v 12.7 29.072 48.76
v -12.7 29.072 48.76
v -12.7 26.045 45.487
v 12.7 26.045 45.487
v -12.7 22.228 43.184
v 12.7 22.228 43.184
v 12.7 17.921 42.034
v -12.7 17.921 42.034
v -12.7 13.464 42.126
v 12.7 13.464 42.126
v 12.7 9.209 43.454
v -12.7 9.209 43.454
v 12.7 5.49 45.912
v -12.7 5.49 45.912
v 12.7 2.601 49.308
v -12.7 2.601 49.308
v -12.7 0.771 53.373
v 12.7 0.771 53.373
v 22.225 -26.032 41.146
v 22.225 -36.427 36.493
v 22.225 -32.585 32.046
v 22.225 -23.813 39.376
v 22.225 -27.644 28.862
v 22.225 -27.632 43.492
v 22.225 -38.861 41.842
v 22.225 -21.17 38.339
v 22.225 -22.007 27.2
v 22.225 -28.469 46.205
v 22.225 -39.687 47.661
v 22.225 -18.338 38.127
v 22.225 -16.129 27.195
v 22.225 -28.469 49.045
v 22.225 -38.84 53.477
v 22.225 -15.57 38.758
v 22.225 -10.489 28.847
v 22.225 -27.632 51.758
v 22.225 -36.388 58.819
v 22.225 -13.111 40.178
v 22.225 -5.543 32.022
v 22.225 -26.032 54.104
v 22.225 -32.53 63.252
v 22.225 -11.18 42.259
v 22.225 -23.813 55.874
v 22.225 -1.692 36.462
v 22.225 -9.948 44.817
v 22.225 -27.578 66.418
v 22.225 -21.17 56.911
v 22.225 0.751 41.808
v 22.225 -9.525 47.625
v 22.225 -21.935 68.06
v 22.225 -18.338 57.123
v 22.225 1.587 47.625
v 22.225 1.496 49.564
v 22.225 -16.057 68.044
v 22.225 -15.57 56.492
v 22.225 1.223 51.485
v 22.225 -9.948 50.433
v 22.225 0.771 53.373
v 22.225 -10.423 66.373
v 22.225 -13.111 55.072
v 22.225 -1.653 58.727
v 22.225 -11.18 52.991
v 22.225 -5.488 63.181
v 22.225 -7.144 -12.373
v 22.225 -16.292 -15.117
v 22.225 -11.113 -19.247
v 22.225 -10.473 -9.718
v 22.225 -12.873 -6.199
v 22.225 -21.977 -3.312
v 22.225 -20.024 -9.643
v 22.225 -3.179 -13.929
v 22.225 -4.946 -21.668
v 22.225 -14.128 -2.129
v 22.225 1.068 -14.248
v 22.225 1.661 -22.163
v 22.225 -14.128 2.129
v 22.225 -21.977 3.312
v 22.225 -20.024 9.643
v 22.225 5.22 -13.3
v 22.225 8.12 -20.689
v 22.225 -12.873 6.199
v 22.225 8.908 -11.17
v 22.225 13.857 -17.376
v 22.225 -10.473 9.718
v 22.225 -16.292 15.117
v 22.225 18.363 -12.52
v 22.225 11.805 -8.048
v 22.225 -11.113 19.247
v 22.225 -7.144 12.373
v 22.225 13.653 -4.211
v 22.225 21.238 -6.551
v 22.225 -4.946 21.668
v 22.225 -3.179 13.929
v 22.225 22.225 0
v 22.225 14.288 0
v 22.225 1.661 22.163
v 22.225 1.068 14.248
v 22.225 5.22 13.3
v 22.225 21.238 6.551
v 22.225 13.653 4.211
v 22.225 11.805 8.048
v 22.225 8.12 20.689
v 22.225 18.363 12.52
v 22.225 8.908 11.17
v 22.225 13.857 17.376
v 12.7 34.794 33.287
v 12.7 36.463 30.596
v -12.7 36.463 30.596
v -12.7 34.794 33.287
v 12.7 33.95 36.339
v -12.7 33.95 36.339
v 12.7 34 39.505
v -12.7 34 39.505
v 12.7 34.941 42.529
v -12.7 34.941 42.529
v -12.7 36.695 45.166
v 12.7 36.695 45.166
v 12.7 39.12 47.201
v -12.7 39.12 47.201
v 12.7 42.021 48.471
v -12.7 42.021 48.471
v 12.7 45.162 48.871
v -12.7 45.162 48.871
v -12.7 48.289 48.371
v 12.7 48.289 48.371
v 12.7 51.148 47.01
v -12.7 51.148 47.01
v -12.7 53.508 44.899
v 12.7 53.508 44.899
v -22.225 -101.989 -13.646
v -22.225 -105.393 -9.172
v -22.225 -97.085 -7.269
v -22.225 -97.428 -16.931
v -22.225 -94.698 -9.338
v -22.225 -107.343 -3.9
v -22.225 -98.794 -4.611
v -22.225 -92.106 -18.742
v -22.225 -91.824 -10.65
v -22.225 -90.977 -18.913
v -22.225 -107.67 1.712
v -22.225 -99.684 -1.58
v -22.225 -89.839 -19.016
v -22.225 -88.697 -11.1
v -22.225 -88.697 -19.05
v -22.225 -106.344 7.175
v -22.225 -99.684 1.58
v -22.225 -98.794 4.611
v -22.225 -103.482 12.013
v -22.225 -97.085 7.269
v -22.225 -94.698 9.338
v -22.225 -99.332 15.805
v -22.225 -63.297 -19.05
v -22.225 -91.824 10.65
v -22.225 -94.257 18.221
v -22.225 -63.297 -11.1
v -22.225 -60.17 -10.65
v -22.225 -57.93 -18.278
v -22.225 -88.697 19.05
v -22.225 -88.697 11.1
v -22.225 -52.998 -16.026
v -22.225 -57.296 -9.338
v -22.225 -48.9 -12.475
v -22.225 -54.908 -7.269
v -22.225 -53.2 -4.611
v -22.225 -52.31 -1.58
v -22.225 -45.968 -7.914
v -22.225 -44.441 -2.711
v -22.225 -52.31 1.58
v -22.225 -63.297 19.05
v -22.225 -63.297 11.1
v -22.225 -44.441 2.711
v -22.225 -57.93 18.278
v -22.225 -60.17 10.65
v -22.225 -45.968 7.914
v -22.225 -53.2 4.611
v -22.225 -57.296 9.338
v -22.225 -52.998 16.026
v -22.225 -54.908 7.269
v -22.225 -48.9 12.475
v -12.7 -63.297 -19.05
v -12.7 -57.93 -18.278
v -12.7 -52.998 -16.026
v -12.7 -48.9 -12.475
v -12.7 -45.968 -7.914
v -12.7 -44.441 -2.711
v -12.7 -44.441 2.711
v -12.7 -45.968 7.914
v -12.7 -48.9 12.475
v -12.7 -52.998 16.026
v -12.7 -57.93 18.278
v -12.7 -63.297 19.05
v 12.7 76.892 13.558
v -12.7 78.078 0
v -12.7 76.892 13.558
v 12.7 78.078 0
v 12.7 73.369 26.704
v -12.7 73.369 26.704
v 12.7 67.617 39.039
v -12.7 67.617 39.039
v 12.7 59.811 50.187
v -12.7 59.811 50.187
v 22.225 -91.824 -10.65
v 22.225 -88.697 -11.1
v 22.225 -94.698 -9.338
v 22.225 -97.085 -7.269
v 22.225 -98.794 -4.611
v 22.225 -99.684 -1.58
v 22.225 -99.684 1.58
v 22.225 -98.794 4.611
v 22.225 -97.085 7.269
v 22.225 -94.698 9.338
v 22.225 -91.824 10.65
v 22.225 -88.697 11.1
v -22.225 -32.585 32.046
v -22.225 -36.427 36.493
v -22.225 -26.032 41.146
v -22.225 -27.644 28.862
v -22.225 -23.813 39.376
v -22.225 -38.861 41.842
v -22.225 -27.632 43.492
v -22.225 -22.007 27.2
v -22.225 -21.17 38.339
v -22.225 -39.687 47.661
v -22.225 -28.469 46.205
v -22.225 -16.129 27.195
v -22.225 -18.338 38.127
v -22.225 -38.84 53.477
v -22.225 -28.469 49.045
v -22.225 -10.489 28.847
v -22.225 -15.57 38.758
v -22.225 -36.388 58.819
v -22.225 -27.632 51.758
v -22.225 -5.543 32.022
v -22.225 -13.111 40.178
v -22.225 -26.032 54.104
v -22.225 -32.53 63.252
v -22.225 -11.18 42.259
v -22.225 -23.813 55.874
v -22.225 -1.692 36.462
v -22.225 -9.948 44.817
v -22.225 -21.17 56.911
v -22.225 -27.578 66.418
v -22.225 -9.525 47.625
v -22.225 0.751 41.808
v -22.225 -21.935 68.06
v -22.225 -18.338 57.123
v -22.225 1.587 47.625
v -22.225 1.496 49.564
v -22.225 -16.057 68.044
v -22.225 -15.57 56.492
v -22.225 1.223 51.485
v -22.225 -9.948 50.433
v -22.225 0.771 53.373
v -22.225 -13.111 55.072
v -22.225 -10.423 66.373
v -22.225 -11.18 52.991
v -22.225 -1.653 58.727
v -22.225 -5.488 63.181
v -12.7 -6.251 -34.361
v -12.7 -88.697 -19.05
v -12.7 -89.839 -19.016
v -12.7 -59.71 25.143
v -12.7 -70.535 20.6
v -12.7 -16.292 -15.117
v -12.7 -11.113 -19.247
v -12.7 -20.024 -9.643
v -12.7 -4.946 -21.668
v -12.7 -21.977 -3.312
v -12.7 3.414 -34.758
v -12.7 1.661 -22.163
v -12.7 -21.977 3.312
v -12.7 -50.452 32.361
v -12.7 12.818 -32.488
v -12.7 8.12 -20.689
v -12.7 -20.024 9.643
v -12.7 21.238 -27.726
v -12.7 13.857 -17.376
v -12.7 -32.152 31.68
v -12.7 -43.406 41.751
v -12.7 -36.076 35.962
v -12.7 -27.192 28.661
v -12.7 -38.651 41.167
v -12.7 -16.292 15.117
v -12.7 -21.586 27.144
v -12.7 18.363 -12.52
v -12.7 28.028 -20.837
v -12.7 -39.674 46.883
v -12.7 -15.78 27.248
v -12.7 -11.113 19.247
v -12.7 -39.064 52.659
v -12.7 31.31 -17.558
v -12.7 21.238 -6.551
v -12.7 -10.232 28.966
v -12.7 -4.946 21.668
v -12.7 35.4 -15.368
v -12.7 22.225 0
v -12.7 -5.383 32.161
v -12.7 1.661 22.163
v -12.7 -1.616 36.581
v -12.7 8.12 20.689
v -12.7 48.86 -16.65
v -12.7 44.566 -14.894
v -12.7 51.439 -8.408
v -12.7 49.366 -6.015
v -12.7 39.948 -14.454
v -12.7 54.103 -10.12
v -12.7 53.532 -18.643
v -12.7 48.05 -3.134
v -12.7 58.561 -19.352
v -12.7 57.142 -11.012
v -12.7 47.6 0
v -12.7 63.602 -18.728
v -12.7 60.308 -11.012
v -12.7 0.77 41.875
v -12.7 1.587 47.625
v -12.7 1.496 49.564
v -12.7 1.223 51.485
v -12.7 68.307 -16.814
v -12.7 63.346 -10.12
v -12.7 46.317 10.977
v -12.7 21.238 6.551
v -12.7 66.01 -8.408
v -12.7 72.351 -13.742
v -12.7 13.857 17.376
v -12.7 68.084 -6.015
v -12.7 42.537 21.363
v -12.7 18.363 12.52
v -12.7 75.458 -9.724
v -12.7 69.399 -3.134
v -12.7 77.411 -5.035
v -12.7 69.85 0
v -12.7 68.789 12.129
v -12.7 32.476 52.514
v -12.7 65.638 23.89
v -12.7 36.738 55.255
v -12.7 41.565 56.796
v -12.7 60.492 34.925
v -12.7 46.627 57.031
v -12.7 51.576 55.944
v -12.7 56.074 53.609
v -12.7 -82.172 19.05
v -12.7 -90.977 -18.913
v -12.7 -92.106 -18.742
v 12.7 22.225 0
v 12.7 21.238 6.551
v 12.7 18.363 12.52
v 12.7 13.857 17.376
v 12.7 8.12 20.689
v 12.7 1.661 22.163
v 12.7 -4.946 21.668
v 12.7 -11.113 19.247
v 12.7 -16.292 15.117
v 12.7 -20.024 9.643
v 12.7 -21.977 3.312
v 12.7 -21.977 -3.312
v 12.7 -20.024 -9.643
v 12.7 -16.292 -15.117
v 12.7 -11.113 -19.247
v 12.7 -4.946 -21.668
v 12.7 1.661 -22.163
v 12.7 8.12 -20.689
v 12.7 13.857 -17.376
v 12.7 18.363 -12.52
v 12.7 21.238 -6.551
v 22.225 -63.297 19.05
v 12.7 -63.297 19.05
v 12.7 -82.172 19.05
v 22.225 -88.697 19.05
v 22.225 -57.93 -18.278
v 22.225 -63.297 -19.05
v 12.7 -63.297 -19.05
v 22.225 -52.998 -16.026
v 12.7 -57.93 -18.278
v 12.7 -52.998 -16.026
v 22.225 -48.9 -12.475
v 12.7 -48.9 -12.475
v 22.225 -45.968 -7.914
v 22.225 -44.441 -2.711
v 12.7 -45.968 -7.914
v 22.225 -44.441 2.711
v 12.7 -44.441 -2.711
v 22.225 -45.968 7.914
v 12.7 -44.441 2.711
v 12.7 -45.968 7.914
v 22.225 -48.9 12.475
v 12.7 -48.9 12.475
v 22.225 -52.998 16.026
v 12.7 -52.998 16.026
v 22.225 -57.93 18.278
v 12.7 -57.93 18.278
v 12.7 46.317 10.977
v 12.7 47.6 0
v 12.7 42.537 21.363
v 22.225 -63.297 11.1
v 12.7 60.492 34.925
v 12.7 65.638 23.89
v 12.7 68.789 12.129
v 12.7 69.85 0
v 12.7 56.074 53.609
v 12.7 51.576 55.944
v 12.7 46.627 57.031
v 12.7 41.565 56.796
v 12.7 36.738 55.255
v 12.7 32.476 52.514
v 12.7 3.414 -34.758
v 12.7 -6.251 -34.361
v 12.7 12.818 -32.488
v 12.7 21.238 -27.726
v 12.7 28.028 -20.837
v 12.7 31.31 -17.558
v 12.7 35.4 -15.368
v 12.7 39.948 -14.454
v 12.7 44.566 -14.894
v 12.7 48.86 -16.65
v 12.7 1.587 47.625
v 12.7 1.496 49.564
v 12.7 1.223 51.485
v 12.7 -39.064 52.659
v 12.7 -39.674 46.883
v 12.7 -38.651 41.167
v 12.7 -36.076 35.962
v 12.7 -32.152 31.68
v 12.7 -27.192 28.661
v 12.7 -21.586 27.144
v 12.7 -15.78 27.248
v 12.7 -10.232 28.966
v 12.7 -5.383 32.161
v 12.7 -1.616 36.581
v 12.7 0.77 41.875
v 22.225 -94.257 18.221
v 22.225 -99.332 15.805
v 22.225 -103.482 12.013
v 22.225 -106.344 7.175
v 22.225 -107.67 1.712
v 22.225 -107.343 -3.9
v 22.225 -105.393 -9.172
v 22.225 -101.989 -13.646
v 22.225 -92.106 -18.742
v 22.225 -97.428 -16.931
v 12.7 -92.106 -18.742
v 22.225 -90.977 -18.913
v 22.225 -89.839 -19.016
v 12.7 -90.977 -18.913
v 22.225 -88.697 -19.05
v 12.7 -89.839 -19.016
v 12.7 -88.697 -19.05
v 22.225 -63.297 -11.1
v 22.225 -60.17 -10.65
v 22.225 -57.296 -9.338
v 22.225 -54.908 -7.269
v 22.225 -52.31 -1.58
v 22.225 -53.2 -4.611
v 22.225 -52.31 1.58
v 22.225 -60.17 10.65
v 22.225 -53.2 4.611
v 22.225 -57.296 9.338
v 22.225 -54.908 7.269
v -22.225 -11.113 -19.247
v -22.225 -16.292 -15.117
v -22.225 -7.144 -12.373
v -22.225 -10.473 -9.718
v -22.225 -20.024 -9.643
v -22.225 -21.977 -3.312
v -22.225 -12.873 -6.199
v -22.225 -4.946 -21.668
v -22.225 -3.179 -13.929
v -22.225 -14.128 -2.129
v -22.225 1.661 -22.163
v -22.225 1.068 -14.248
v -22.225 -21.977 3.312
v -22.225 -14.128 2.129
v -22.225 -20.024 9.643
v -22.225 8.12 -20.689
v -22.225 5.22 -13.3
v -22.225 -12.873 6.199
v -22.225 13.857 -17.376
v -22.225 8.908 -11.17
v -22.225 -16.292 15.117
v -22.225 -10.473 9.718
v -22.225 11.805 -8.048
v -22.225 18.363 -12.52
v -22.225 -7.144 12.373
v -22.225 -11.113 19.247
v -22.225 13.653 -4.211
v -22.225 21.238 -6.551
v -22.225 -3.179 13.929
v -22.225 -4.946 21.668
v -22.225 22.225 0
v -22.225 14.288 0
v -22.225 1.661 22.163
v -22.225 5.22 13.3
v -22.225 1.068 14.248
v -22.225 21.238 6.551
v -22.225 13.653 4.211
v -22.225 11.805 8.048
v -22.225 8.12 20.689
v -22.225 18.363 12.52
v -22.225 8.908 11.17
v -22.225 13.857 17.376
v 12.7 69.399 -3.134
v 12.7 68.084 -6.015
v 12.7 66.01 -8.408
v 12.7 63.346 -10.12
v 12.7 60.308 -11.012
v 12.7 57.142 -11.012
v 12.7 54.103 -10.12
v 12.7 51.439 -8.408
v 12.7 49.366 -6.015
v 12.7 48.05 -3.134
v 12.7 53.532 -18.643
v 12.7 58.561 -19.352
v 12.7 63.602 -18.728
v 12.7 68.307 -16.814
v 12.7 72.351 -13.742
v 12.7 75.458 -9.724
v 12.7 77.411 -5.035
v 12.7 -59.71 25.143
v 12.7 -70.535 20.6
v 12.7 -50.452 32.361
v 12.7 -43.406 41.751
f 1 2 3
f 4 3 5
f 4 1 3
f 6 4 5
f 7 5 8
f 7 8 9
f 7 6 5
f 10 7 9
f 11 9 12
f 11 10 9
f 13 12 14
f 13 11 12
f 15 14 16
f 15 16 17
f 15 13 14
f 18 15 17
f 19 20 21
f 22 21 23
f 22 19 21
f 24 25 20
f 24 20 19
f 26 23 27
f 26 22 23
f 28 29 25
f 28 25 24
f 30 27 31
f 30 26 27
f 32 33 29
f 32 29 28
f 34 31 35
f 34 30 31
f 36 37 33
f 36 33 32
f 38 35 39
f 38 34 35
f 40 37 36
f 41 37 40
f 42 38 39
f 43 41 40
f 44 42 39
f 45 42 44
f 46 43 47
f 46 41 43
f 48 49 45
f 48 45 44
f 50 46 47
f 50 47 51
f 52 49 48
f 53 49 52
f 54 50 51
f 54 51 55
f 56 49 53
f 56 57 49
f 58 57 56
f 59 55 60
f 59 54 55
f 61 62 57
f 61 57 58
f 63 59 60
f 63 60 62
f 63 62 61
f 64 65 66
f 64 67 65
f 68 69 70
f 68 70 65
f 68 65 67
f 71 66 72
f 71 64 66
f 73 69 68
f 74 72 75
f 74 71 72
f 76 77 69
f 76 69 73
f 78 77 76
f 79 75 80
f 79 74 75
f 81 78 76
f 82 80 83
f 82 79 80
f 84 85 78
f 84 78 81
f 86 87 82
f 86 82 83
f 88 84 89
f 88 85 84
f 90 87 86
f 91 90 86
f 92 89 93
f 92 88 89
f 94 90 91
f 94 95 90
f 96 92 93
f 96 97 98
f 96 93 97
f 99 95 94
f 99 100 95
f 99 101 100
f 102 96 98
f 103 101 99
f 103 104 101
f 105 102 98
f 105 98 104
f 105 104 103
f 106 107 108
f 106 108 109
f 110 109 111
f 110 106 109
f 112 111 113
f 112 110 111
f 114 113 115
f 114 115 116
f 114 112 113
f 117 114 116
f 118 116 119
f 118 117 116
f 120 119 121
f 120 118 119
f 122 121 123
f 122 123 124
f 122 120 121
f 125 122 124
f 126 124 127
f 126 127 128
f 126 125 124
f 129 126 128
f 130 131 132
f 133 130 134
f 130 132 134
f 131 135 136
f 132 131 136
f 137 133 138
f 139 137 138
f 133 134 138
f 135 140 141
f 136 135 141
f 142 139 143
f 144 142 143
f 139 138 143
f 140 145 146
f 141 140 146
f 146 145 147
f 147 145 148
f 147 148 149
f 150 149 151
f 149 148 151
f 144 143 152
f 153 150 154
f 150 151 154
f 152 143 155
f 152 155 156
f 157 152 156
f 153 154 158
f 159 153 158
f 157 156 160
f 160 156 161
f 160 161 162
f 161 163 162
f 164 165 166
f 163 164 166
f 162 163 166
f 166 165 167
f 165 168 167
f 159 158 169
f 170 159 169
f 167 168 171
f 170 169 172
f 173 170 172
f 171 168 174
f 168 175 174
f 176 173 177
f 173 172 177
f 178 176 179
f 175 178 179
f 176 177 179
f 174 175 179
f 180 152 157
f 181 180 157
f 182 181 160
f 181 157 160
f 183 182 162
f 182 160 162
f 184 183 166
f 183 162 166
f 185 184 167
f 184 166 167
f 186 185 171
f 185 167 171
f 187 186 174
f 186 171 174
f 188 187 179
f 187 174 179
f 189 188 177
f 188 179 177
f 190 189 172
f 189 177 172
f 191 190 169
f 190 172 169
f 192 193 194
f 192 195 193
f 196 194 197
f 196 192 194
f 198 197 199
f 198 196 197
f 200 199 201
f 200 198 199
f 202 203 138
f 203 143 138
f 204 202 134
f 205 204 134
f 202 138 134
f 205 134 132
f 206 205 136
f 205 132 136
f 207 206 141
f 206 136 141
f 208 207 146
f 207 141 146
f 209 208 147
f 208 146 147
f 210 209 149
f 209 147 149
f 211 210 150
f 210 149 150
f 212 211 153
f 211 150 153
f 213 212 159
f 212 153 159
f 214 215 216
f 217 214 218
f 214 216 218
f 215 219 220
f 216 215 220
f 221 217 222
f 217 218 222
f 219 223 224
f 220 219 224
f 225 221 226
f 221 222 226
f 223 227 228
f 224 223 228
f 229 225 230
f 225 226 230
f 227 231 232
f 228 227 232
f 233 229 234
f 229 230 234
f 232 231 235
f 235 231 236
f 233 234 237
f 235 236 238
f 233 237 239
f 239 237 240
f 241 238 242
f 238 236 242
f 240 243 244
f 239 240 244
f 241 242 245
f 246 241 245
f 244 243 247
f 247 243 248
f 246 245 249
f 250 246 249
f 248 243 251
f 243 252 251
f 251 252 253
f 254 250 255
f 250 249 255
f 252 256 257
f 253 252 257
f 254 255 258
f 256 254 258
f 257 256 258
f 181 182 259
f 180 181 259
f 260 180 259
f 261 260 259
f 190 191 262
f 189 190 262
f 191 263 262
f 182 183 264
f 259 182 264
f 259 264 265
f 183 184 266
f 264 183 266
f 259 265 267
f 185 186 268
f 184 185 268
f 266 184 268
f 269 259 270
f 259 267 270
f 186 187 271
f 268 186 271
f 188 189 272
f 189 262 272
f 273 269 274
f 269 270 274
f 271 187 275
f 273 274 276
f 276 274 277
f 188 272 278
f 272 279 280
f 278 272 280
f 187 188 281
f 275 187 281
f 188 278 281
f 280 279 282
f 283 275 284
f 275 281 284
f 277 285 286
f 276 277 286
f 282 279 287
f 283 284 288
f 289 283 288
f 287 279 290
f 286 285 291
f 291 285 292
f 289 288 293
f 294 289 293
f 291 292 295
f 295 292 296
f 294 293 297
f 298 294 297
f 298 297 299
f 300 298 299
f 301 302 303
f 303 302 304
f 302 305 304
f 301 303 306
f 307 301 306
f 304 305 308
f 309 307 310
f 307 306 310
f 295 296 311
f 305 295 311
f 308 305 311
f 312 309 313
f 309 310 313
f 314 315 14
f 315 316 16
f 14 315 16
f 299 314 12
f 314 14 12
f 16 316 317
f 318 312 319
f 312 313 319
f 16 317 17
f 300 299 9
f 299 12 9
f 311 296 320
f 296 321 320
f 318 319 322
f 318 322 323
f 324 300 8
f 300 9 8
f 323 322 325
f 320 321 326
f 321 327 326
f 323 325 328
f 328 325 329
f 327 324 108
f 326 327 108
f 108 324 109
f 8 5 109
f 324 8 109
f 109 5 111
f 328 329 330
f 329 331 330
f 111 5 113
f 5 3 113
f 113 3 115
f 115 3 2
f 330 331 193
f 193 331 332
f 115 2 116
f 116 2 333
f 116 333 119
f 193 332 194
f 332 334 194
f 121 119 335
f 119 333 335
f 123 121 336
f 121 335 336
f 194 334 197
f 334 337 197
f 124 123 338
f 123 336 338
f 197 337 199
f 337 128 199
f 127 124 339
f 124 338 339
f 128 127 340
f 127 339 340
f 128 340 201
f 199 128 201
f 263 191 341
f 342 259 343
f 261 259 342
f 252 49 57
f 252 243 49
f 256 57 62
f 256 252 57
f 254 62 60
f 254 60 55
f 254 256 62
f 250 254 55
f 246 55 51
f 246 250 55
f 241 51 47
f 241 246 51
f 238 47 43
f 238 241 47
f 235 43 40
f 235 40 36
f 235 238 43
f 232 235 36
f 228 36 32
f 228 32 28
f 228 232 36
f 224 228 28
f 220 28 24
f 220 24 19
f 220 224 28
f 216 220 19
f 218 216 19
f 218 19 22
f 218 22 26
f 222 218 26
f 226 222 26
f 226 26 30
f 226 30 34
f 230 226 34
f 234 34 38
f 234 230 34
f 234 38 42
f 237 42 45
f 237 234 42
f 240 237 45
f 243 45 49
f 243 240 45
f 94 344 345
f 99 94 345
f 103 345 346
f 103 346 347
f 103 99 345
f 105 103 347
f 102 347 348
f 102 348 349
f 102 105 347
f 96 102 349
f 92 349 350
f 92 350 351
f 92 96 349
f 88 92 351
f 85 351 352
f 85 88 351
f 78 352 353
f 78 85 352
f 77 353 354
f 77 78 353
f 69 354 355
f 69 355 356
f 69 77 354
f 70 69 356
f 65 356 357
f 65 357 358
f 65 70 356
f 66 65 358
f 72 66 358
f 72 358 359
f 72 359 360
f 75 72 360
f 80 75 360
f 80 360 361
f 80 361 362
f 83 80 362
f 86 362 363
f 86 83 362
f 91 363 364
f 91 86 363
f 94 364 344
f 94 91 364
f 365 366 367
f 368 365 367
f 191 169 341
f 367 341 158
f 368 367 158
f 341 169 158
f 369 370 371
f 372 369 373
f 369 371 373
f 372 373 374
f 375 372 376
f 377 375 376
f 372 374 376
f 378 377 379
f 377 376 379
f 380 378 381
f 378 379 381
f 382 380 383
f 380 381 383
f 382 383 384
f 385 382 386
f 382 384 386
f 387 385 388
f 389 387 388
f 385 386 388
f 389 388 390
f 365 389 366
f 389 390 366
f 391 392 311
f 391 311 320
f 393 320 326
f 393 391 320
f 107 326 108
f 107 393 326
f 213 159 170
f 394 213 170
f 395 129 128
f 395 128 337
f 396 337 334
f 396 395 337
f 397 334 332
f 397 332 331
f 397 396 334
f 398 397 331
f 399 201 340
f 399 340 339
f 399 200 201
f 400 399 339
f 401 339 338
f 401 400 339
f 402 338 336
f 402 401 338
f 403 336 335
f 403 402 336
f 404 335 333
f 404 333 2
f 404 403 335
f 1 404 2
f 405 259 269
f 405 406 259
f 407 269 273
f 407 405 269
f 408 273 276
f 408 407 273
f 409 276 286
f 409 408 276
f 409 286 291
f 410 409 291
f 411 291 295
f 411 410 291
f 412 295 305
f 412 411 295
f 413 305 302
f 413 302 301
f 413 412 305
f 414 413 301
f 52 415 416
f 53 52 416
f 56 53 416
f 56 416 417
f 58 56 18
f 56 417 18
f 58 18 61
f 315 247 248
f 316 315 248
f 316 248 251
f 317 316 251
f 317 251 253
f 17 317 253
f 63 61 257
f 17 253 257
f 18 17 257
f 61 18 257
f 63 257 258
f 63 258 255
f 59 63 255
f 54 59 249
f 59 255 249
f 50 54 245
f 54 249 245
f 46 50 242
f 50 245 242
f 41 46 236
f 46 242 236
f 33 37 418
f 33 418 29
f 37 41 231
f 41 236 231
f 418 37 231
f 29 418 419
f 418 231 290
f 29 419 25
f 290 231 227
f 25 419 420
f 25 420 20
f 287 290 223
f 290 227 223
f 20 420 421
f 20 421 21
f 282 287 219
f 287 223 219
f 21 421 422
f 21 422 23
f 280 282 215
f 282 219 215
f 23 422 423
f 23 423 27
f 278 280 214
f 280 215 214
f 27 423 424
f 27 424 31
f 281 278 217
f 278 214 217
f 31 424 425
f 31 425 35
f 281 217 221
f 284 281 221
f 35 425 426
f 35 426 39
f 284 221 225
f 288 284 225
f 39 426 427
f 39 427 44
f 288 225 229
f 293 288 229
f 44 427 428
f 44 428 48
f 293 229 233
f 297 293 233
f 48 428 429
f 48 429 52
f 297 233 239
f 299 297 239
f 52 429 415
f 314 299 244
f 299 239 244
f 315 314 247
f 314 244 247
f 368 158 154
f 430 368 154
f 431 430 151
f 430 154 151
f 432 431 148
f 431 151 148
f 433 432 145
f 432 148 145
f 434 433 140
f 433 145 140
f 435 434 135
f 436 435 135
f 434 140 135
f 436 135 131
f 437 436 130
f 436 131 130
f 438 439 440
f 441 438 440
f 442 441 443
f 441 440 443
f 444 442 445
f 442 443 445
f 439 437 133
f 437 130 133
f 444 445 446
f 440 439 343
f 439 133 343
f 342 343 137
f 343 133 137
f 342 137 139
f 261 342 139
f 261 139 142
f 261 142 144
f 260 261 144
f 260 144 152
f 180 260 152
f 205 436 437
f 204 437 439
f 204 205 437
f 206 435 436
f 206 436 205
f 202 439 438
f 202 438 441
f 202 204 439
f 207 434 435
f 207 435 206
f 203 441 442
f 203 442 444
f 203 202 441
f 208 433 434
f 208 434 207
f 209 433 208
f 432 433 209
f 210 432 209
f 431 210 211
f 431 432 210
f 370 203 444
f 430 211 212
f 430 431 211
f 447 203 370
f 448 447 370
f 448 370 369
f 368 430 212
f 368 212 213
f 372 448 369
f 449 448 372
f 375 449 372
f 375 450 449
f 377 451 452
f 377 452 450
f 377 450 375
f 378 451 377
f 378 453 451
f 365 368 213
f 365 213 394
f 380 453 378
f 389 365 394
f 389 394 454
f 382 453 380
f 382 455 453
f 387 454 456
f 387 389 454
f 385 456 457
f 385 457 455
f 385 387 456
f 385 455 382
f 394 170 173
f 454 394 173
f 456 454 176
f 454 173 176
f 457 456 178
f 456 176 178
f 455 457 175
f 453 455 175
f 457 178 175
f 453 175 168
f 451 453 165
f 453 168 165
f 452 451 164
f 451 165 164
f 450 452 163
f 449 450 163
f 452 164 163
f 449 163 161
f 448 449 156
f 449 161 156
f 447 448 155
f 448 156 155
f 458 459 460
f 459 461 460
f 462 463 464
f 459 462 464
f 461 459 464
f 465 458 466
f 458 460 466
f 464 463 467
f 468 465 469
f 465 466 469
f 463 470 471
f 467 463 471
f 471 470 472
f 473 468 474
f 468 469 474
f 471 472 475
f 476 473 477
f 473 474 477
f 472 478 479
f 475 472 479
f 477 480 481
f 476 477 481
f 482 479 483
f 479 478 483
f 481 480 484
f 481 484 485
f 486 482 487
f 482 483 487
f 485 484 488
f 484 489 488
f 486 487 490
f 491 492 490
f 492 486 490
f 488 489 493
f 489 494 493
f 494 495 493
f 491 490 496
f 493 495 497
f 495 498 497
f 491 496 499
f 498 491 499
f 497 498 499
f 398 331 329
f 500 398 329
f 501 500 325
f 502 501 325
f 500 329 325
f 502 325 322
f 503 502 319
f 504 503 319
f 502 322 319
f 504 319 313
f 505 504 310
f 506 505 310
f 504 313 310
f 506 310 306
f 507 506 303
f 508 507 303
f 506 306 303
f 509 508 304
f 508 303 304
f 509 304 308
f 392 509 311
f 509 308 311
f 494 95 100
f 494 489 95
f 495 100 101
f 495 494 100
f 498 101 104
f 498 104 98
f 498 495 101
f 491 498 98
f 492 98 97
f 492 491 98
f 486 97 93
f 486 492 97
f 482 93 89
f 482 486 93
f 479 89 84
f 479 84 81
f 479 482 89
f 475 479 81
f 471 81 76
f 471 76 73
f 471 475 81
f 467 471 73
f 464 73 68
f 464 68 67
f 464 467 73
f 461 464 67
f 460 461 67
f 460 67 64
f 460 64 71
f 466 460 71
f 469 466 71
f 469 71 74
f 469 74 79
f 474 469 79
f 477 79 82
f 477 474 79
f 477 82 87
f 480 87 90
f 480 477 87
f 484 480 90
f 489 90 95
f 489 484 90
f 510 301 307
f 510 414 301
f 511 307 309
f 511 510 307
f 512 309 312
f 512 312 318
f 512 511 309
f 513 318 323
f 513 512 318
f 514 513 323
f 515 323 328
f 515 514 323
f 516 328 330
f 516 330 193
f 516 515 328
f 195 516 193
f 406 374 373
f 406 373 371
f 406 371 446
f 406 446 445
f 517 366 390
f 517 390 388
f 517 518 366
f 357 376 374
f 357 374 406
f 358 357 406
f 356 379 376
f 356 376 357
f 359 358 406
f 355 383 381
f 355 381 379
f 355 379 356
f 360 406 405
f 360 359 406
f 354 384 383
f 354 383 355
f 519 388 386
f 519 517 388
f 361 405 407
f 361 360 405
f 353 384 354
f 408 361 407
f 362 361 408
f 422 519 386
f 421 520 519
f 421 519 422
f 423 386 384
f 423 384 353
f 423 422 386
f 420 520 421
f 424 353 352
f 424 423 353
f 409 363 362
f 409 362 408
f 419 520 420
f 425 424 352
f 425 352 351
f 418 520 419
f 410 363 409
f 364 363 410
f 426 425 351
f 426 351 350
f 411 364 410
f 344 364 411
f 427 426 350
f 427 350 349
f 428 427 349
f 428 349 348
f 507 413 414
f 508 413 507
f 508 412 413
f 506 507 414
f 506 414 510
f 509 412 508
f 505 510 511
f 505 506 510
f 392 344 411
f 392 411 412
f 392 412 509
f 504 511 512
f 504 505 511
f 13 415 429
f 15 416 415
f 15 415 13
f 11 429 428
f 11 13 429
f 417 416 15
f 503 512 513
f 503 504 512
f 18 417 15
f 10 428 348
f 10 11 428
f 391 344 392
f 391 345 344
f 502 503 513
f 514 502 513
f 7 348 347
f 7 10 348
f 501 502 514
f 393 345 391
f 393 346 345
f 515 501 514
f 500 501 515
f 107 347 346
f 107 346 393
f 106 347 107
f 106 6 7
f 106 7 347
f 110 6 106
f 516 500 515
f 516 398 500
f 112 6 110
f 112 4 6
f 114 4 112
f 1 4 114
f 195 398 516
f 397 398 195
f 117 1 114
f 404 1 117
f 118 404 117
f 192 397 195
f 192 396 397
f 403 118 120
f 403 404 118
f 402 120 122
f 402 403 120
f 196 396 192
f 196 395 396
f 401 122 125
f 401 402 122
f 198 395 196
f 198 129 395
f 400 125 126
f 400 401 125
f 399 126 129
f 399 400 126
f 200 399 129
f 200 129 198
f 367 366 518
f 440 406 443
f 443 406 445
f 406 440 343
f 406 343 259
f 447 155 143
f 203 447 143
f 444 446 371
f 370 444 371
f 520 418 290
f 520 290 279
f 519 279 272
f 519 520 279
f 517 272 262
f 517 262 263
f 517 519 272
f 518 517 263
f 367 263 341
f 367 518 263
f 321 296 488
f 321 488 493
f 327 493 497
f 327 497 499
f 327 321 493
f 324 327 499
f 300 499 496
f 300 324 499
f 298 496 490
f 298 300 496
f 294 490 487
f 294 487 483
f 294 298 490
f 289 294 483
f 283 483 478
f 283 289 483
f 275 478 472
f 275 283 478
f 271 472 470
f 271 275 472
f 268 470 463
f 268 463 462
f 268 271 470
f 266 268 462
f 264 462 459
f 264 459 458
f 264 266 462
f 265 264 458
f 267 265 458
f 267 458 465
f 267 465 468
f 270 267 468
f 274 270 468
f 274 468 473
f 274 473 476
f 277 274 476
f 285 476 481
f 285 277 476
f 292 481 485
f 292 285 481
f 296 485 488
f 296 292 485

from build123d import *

# Parameters (mm, degrees)
F0_R     = 22.225
F1_DEPTH = 12.7
F0_R_2   = 9.525
F0_R_3   = 14.2875
F2_DEPTH = 22.225


with BuildPart() as f1:
    # F0 (on Right) → F1 (new body, symmetric)
    with BuildSketch(Plane.YZ):
        with BuildLine():
            ThreePointArc((0.7709428469, 53.3727500739), (1.3823409605, 50.5277313214), (1.5875, 47.625))
            ThreePointArc((1.5875, 47.625), (-21.5859879765, 27.1439069815), (-39.0642428209, 52.6585365854))
            ThreePointArc((-39.0642428209, 52.6585365854), (-54.8414617427, 28.4450035745), (-82.1718427428, 19.05))
            Line((-82.1718427428, 19.05), (-63.2968, 19.05))
            ThreePointArc((-63.2968, 19.05), (-44.2468, 0), (-63.2968, -19.05))
            Line((-63.2968, -19.05), (-88.6968, -19.05))
            ThreePointArc((-88.6968, -19.05), (-90.408513446, -18.9729422357), (-92.1063790378, -18.7423923442))
            Line((-92.1063790378, -18.7423923442), (-6.2508949026, -34.3610526311))
            ThreePointArc((-6.2508949026, -34.3610526311), (12.8175803312, -32.4879248253), (28.0282905638, -20.8367596586))
            ThreePointArc((28.0282905638, -20.8367596586), (37.6405240223, -14.7442138944), (48.8602257395, -16.650109833))
            ThreePointArc((48.8602257395, -16.650109833), (68.3067503871, -16.8143453506), (78.0777321497, 0))
            ThreePointArc((78.0777321497, 0), (73.3690687488, 26.7041571404), (59.8110128446, 50.1873988183))
            ThreePointArc((59.8110128446, 50.1873988183), (44.0883532808, 57.07968597), (29.0718597616, 48.7603970384))
            ThreePointArc((29.0718597616, 48.7603970384), (13.4642776808, 42.1258150573), (0.7709428469, 53.3727500739))
        make_face()
        Circle(F0_R, mode=Mode.SUBTRACT)
        with BuildLine():
            ThreePointArc((69.85, 0), (58.7248, -11.1252), (47.5996, 0))
            ThreePointArc((47.5996, 0), (44.7289928724, 16.2800220142), (36.4634090747, 30.596433106))
            ThreePointArc((36.4634090747, 30.596433106), (37.834665998, 46.2699714599), (53.5082043519, 44.8987145366))
            ThreePointArc((53.5082043519, 44.8987145366), (65.6375295619, 23.8901070113), (69.85, 0))
        make_face(mode=Mode.SUBTRACT)
    extrude(amount=F1_DEPTH, both=True)

    # F0 (on Right) → F2 (join, symmetric)
    with BuildSketch(Plane.YZ):
        with BuildLine():
            Line((-63.2968, 19.05), (-82.1718427428, 19.05))
            Line((-82.1718427428, 19.05), (-88.6968, 19.05))
            ThreePointArc((-88.6968, 19.05), (-107.6697422357, 1.711713446), (-92.1063790378, -18.7423923442))
            ThreePointArc((-92.1063790378, -18.7423923442), (-90.408513446, -18.9729422357), (-88.6968, -19.05))
            Line((-88.6968, -19.05), (-63.2968, -19.05))
            ThreePointArc((-63.2968, -19.05), (-44.2468, 0), (-63.2968, 19.05))
        make_face()
        with BuildLine():
            ThreePointArc((-88.6968, -11.0998), (-99.7966, 0), (-88.6968, 11.0998))
            Line((-88.6968, 11.0998), (-63.2968, 11.0998))
            ThreePointArc((-63.2968, 11.0998), (-52.197, 0), (-63.2968, -11.0998))
            Line((-63.2968, -11.0998), (-88.6968, -11.0998))
        make_face(mode=Mode.SUBTRACT)
        with BuildLine():
            ThreePointArc((-39.0642428209, 52.6585365854), (-21.5859879765, 27.1439069815), (1.5875, 47.625))
            ThreePointArc((1.5875, 47.625), (1.3823409605, 50.5277313214), (0.7709428469, 53.3727500739))
            ThreePointArc((0.7709428469, 53.3727500739), (-19.419954655, 68.2591837688), (-39.0642428209, 52.6585365854))
        make_face()
        with Locations((-19.05, 47.625)):
            Circle(F0_R_2, mode=Mode.SUBTRACT)
        Circle(F0_R)
        Circle(F0_R_3, mode=Mode.SUBTRACT)
    extrude(amount=F2_DEPTH, both=True)


solid = f1.part
